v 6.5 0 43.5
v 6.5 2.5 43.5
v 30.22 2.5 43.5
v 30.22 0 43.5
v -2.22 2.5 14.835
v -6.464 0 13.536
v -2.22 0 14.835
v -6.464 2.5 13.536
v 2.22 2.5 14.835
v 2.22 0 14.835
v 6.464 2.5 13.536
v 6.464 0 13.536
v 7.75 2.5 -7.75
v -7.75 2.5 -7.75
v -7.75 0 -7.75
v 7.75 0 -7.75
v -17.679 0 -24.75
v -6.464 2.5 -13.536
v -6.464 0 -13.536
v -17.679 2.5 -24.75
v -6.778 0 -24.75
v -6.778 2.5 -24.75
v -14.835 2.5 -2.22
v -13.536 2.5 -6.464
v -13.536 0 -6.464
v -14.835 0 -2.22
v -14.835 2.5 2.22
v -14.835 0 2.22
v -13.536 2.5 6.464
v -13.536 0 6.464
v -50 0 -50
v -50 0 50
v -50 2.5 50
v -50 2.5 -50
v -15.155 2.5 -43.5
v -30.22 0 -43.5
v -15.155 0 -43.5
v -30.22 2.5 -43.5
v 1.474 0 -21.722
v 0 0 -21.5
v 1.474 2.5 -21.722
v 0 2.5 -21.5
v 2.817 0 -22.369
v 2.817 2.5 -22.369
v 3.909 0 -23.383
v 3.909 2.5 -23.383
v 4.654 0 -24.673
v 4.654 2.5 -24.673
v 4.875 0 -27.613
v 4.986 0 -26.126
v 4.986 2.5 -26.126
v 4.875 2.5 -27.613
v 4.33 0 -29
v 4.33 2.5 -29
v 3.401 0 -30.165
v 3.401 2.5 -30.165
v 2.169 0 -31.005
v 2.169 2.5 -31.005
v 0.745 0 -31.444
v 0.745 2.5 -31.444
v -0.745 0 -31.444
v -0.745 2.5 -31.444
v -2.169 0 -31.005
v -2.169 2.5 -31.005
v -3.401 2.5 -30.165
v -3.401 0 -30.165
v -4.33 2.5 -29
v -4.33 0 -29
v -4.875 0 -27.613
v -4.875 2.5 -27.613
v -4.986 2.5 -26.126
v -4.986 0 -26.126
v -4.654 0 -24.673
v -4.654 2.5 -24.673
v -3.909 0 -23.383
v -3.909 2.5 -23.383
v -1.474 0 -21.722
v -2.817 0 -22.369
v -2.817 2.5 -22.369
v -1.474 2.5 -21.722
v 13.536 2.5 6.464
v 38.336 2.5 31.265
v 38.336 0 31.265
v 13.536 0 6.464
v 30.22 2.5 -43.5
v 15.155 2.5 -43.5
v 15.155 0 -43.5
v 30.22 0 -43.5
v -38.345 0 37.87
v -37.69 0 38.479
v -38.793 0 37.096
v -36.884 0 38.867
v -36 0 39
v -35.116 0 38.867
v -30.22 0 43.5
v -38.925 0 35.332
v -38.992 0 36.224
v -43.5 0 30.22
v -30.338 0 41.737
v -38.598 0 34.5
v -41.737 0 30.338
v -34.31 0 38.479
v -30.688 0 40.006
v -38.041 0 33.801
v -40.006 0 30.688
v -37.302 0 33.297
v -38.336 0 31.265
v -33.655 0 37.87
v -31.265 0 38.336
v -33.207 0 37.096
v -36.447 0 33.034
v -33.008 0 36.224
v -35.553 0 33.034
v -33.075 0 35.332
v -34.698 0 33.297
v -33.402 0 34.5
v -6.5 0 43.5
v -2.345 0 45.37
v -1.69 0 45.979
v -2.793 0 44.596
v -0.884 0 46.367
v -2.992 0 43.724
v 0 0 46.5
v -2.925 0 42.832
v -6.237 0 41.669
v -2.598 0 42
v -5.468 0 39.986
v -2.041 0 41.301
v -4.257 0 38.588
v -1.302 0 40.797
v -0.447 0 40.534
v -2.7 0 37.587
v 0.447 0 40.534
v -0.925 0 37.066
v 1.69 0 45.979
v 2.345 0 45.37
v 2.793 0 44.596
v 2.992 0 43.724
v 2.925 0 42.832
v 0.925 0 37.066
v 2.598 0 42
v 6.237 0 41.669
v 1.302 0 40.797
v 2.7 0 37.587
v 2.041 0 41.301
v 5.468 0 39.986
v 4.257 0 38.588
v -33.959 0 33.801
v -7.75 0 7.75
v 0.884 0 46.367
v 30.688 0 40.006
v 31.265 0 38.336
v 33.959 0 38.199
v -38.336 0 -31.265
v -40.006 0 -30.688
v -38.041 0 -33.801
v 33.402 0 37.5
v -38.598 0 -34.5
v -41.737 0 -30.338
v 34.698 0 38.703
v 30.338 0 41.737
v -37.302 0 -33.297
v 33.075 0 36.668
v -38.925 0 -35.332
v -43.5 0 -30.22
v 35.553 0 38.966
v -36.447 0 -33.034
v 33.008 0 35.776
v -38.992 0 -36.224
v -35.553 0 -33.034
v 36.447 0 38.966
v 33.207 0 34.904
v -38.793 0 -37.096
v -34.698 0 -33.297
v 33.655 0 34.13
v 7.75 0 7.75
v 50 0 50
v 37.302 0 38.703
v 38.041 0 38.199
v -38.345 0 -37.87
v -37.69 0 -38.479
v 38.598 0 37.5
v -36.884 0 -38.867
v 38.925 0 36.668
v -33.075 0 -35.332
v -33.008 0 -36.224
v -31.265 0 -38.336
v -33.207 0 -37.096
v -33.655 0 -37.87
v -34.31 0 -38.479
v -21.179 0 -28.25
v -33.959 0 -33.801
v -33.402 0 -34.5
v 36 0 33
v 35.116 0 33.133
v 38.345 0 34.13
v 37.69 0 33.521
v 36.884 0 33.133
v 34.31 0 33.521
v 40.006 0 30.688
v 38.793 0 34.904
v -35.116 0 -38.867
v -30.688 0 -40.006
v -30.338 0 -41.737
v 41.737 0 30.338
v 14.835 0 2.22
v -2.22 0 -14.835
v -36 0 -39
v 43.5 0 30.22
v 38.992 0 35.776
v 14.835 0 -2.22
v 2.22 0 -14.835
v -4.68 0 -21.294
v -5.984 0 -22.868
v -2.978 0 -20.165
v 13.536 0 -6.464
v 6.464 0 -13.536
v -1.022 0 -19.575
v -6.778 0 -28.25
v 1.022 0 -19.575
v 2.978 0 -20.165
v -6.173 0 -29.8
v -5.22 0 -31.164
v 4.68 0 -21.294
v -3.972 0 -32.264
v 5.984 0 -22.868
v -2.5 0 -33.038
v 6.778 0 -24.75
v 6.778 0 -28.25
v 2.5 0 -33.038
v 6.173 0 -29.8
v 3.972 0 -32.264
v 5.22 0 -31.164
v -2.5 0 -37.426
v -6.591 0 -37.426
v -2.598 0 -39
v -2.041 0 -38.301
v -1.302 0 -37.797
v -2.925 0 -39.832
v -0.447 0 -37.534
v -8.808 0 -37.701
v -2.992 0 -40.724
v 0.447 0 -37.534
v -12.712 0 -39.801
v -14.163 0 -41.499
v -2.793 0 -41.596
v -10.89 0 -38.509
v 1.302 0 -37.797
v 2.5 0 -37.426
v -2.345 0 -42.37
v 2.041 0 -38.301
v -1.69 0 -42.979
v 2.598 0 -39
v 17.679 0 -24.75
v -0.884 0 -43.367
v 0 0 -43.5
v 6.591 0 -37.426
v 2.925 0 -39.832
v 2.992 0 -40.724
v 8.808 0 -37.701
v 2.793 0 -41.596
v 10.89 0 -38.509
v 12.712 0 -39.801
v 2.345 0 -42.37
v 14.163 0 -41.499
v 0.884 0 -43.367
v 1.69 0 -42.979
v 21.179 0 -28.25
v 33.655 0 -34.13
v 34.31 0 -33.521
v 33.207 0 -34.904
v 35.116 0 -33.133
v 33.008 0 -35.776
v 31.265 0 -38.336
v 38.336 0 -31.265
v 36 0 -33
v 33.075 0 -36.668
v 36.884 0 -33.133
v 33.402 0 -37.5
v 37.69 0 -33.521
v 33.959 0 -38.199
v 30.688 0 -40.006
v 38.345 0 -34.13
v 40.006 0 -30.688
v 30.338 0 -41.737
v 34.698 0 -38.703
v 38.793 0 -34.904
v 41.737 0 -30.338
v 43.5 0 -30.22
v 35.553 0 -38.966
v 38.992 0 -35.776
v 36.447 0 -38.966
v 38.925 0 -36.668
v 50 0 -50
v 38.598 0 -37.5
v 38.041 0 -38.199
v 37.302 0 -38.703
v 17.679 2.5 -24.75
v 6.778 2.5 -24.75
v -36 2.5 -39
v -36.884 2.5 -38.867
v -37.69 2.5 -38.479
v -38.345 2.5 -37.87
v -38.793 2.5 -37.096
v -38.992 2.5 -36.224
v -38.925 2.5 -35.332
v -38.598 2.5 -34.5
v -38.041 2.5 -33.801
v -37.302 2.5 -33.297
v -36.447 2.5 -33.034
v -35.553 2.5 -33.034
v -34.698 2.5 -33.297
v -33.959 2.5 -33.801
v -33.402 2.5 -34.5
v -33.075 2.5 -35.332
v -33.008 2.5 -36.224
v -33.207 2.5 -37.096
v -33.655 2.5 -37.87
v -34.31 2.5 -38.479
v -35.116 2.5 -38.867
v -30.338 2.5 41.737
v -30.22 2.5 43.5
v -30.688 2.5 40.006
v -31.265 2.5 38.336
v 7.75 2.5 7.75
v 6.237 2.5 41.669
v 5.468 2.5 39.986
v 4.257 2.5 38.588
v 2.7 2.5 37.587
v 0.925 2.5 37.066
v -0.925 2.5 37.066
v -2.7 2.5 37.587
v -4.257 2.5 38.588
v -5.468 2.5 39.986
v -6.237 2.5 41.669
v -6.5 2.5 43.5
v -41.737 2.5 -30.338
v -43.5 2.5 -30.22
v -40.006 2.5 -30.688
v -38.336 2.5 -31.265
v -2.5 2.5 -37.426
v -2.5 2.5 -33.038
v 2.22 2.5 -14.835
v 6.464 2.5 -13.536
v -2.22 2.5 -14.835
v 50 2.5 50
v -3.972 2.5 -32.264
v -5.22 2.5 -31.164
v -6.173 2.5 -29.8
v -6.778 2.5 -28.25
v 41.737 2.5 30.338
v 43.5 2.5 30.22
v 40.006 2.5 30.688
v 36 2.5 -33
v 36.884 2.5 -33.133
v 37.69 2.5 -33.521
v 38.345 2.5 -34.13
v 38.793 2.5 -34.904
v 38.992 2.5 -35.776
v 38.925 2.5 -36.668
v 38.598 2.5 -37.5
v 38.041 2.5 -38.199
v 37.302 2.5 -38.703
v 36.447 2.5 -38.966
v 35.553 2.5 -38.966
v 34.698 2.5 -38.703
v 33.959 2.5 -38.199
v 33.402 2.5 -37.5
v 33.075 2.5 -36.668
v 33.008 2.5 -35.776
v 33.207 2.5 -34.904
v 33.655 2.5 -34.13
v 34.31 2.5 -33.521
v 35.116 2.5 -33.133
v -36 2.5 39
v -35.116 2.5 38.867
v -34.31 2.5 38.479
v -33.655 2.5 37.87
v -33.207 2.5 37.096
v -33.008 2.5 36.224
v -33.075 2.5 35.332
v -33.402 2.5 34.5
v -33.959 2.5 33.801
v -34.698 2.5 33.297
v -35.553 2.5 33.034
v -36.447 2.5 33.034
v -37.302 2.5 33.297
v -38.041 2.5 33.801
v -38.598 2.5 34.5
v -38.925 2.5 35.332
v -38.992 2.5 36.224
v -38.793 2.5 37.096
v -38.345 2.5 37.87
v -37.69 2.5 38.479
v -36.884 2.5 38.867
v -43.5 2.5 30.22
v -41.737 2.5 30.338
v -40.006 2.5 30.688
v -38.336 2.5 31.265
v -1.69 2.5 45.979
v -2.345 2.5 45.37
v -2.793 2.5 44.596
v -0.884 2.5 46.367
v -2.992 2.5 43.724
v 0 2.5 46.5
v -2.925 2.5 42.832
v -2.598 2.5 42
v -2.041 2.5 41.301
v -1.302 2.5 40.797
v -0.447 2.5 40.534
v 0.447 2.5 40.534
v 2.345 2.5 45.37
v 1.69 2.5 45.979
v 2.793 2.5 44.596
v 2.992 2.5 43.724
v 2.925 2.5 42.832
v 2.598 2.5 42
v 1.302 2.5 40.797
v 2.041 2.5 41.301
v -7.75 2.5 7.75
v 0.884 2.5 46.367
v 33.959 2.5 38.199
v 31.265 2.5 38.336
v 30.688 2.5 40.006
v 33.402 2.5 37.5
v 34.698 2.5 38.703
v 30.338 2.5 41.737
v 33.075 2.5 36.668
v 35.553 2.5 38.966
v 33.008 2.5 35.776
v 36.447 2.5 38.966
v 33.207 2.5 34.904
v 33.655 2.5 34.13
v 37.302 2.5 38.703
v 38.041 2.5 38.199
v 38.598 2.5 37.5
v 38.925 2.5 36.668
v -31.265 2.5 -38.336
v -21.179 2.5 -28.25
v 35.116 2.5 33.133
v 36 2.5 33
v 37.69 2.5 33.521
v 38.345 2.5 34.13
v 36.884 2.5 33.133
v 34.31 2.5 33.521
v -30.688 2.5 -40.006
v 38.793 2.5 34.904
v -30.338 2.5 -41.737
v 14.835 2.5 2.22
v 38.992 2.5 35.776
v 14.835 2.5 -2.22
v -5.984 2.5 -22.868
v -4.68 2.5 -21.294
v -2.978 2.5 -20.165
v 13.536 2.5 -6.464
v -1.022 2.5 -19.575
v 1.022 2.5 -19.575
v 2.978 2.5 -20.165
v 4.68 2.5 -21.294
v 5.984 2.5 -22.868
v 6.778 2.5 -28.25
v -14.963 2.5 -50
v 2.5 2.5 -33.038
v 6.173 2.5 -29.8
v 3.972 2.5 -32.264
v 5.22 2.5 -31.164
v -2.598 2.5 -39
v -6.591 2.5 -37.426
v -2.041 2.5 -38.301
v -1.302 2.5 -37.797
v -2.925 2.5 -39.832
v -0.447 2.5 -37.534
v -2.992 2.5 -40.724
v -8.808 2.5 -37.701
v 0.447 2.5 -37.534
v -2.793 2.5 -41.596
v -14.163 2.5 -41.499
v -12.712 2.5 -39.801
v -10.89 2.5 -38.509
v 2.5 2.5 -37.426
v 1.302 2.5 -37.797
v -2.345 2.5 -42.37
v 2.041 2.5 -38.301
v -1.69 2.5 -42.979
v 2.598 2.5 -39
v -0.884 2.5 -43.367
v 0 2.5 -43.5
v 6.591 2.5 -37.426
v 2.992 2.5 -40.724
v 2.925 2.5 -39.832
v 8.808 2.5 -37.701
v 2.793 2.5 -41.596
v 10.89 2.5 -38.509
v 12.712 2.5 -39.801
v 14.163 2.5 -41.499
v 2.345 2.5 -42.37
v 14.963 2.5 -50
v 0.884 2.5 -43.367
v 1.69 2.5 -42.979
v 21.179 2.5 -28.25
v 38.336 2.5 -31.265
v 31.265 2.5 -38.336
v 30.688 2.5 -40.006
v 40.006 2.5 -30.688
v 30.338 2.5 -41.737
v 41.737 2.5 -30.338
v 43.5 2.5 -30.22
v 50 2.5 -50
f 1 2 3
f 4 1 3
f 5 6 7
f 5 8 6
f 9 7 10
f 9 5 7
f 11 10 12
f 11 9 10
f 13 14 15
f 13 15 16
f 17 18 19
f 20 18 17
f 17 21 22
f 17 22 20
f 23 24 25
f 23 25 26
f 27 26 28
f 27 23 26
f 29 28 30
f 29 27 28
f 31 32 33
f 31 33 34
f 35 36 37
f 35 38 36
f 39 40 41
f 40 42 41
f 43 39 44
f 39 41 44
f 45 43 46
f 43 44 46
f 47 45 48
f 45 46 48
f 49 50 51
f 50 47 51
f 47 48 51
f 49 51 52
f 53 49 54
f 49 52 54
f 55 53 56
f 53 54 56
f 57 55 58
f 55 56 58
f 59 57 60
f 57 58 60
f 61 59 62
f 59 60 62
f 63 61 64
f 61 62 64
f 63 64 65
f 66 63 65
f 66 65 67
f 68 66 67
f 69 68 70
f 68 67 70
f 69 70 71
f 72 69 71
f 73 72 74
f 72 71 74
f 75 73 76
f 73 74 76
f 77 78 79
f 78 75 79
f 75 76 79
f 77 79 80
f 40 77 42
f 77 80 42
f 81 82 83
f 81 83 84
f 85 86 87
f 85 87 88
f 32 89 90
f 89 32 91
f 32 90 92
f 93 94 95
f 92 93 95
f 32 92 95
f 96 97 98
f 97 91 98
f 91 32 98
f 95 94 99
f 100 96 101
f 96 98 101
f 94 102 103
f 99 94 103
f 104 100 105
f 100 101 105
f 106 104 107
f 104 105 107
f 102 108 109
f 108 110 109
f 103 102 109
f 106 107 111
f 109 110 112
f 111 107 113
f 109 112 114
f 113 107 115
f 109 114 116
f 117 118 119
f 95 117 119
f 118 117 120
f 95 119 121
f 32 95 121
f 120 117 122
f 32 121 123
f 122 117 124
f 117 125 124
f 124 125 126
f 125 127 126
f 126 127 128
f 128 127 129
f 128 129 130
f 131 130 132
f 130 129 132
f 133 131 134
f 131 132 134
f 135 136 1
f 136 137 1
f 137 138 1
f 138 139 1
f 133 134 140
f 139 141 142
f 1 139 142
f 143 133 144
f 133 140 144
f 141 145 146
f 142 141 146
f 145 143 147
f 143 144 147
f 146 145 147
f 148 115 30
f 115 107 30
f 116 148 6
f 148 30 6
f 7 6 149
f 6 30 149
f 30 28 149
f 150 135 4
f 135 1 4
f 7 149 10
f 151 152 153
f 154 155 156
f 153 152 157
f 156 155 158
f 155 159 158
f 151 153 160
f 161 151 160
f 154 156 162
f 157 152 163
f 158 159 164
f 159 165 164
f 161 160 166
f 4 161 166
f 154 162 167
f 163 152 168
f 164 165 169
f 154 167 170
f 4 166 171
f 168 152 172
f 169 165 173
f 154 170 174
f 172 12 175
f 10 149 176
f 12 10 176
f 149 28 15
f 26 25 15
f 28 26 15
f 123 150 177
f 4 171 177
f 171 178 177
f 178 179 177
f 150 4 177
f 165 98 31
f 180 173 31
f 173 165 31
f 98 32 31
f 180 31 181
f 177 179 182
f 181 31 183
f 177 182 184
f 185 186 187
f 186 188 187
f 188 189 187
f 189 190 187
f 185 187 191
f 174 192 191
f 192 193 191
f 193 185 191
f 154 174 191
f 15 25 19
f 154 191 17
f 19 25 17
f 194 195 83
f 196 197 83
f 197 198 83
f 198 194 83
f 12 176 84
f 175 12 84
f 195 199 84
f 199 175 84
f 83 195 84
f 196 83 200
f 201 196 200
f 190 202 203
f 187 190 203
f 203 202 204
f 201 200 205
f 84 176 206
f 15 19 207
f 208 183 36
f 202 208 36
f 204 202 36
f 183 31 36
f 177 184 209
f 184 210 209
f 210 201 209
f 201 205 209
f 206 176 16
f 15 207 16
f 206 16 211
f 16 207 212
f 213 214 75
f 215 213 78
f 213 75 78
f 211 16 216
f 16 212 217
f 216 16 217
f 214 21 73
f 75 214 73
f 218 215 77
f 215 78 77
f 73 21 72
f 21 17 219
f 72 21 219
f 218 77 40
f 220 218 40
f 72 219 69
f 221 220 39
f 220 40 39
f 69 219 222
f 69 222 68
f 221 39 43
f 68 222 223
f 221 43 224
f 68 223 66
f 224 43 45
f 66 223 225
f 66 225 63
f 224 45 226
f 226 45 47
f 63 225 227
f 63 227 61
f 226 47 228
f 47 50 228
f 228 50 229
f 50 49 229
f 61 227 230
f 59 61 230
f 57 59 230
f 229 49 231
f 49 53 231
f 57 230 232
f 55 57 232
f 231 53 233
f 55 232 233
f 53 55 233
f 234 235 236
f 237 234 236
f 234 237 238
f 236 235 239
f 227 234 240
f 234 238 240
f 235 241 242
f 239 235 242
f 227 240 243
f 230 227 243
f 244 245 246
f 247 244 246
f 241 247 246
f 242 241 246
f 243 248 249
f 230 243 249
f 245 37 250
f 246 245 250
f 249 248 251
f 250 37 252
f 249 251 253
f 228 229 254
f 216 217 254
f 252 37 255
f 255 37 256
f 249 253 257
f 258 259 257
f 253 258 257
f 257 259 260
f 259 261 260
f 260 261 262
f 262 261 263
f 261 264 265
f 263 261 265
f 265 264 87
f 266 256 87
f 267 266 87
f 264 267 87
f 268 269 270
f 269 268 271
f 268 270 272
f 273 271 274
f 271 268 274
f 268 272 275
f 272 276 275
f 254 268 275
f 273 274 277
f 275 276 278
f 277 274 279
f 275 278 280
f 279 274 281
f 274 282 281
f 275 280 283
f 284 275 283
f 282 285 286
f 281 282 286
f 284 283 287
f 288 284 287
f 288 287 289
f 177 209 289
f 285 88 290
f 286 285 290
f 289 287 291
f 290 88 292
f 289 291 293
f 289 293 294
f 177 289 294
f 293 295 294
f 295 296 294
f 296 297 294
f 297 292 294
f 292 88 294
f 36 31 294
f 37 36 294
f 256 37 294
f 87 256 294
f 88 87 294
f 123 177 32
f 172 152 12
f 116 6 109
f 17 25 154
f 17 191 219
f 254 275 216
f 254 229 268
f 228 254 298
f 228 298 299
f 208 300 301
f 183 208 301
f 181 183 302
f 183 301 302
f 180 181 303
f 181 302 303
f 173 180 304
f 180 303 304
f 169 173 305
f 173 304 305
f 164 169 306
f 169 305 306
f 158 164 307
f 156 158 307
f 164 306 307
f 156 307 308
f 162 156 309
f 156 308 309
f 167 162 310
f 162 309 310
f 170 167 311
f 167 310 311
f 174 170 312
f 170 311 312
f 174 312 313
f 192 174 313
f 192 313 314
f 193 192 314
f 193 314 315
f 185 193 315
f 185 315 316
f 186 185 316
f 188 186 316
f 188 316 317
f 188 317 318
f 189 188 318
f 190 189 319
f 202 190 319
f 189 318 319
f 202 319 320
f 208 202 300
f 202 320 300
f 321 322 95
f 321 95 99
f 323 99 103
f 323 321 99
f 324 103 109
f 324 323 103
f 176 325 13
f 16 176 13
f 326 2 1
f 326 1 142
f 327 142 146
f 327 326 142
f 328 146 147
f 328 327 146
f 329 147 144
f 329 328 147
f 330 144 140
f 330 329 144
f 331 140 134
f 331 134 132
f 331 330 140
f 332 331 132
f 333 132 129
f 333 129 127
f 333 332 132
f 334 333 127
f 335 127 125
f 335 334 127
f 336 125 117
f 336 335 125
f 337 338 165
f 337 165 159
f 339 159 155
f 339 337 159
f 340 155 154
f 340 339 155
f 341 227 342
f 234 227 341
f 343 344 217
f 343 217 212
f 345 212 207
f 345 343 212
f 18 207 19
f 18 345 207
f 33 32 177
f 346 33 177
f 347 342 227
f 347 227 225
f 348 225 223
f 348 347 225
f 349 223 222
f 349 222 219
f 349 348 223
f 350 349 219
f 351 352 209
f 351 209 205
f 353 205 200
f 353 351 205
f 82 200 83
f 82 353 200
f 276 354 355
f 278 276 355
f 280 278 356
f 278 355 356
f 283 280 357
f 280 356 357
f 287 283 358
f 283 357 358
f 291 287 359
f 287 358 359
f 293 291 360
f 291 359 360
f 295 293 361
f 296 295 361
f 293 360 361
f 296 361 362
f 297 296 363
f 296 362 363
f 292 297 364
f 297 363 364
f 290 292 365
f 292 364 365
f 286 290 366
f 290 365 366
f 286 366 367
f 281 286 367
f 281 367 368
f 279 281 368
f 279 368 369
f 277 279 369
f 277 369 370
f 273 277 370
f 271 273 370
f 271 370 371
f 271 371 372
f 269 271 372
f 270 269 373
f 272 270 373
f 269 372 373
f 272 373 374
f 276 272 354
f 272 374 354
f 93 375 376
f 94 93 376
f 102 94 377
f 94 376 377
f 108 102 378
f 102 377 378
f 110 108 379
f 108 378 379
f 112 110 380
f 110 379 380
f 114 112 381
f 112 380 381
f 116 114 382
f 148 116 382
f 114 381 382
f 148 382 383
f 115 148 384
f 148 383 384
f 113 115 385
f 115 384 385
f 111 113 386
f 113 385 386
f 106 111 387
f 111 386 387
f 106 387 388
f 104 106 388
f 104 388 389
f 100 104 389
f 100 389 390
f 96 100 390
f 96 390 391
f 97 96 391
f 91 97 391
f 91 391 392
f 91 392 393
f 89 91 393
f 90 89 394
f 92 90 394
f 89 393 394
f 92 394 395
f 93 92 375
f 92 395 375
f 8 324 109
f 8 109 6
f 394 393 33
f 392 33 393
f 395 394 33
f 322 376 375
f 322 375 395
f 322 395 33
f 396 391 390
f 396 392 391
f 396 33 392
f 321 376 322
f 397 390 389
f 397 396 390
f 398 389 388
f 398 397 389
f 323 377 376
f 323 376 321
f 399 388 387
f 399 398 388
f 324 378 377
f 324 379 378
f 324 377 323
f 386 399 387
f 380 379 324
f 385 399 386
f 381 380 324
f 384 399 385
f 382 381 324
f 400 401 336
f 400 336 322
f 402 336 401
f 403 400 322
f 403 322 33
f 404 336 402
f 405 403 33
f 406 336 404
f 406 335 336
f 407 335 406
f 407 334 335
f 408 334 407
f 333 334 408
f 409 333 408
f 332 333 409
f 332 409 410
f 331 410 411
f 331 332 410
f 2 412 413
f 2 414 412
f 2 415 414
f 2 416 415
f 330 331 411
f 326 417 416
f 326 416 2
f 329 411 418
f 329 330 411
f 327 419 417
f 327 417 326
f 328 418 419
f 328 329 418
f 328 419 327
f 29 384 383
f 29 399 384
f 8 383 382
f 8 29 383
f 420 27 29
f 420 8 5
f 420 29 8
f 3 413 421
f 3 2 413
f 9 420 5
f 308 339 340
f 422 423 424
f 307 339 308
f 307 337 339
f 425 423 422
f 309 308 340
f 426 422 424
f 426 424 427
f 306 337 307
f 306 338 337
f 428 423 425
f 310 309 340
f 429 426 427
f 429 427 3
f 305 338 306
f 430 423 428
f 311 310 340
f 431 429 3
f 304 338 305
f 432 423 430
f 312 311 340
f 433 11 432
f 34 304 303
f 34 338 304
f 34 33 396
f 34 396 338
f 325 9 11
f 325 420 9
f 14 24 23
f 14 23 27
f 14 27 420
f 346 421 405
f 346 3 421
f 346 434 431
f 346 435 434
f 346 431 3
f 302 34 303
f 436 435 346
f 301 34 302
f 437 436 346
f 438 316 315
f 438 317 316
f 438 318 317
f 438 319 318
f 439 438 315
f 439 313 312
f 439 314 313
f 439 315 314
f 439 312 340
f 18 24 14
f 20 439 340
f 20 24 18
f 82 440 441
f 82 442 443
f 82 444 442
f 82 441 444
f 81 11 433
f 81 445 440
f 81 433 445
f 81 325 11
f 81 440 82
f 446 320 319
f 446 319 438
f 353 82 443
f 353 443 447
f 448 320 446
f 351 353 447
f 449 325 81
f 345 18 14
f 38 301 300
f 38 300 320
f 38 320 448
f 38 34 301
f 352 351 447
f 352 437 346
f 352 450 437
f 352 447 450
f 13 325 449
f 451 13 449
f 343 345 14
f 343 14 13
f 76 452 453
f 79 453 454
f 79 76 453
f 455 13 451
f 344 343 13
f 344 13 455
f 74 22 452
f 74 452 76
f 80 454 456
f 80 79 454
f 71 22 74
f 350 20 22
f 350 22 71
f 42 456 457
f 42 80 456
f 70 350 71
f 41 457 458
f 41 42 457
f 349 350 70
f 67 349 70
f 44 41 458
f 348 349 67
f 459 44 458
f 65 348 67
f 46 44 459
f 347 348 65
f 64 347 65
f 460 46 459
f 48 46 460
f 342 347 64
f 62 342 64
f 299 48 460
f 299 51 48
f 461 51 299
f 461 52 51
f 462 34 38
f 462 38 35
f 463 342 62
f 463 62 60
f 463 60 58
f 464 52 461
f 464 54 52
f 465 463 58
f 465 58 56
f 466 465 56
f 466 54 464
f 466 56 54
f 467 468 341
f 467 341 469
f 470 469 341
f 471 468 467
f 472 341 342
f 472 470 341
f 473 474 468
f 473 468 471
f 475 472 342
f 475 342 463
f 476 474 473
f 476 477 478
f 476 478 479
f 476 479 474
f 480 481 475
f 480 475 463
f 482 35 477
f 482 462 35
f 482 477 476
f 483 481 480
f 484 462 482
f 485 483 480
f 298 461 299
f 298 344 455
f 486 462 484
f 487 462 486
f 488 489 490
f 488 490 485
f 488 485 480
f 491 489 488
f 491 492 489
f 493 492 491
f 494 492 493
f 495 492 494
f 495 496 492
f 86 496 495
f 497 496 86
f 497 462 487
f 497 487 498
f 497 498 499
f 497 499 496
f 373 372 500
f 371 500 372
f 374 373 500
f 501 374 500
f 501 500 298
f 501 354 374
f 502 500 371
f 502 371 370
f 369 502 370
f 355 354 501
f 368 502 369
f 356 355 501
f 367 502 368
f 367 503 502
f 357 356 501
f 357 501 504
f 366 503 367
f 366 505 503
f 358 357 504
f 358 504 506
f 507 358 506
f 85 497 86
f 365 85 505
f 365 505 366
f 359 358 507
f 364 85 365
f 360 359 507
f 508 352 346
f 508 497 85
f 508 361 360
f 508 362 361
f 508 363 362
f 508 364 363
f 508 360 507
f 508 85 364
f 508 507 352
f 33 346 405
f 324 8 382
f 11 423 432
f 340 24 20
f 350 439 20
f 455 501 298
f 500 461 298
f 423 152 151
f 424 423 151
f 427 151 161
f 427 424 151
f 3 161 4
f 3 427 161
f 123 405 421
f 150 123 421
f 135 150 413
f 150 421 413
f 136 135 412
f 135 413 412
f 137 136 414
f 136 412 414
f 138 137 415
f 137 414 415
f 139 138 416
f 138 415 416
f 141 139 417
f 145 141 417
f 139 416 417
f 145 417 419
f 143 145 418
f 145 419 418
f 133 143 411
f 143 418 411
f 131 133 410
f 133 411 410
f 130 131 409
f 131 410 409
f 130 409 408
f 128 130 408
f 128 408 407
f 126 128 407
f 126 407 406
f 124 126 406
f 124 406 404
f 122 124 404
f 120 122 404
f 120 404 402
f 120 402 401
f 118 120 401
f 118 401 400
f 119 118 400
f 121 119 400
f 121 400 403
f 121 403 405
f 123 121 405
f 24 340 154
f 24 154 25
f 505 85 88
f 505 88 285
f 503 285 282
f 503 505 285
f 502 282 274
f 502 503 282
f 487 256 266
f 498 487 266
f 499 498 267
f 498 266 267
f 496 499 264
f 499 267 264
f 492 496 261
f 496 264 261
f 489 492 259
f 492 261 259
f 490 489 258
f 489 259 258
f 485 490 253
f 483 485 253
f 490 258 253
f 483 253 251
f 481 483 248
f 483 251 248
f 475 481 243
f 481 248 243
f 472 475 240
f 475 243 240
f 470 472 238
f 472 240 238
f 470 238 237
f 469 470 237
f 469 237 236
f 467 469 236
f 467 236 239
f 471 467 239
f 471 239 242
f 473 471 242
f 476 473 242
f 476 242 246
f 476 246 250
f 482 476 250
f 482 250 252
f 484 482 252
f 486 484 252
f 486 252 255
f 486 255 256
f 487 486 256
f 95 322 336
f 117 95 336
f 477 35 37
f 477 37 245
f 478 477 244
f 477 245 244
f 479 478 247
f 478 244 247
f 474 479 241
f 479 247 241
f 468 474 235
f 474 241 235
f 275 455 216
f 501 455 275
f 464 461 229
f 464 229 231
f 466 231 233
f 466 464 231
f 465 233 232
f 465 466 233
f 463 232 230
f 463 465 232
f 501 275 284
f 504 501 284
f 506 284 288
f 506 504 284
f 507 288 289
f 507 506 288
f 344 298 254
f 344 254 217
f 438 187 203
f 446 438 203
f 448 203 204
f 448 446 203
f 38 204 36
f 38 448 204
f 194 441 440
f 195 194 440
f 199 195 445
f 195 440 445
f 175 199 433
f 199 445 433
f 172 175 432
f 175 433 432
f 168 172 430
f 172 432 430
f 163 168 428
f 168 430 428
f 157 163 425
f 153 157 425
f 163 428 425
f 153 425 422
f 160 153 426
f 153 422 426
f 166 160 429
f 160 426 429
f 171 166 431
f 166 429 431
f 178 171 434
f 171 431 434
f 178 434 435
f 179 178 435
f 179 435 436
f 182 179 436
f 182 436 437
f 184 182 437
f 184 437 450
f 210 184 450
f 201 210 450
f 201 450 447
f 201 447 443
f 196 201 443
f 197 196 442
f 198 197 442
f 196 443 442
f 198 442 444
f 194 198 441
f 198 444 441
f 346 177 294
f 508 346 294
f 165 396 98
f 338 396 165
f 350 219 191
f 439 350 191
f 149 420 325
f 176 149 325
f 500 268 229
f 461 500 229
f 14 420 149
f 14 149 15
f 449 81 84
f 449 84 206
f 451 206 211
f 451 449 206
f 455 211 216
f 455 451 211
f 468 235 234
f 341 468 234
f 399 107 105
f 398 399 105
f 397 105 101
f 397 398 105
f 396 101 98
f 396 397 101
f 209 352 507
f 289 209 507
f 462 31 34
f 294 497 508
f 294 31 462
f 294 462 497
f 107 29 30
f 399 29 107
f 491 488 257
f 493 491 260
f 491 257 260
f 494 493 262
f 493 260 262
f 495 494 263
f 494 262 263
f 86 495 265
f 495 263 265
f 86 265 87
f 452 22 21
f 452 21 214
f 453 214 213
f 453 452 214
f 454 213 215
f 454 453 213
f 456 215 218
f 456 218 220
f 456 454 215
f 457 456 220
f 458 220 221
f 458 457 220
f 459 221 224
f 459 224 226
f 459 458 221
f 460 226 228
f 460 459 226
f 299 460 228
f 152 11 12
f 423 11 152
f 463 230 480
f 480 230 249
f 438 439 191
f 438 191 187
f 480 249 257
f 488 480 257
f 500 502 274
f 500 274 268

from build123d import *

# Parameters (mm, degrees)
SKETCH1_W           = 100
SKETCH1_H           = 100
BOSS_EXTRUDE1_DEPTH = 2.5
SKETCH5_W           = 87
SKETCH5_H           = 87
CUT_EXTRUDE2_DEPTH  = 4
SKETCH6_R           = 15
BOSS_EXTRUDE3_DEPTH = 2.5
SKETCH7_W           = 15.5
SKETCH7_H           = 15.5
CUT_EXTRUDE3_DEPTH  = 2.5
BOSS_EXTRUDE4_DEPTH = 2.5
EXTRUDE_THIN2_DEPTH = 2.5
SKETCH10_R          = 3
CUT_EXTRUDE5_DEPTH  = 2.5
SKETCH11_R          = 6.5
BOSS_EXTRUDE5_DEPTH = 2.5
SKETCH12_R          = 3
CUT_EXTRUDE6_DEPTH  = 3
SKETCH13_R          = 7
SKETCH13_R_2        = 5
BOSS_EXTRUDE6_DEPTH = 2.5
SKETCH14_W          = 5
SKETCH14_H          = 9
EXTRUDE_THIN5_DEPTH = 2.5
SKETCH15_W          = 17.095160315
SKETCH15_H          = 3.5
EXTRUDE_THIN7_DEPTH = 2.5
BOSS_EXTRUDE8_DEPTH = 2.5
SKETCH20_W          = 31.082582927
SKETCH20_H          = 6.049047595
CUT_EXTRUDE8_DEPTH  = 2.5
SKETCH21_R          = 3
CUT_EXTRUDE9_DEPTH  = 10


with BuildPart() as part:
    # Sketch1 → Boss-Extrude1 (new body)
    with BuildSketch(Plane(origin=(0, 0, 0), x_dir=(1, 0, 0), z_dir=(0, 1, 0))):
        Rectangle(SKETCH1_W, SKETCH1_H)
    extrude(amount=BOSS_EXTRUDE1_DEPTH)

    # Sketch5 → Cut-Extrude2 (cut)
    with BuildSketch(Plane(origin=(0, 2.5, 0), x_dir=(1, 0, 0), z_dir=(0, 1, 0))):
        Rectangle(SKETCH5_W, SKETCH5_H)
    extrude(amount=-CUT_EXTRUDE2_DEPTH, mode=Mode.SUBTRACT)

    # Sketch8 → Boss-Extrude4 (add)
    with BuildSketch(Plane(origin=(0, 2.5, 0), x_dir=(1, 0, 0), z_dir=(0, 1, 0))):
        with BuildLine():
            Line((-43.5, -43.5), (-30.220069463, -43.5))
            ThreePointArc((-30.220069463, -43.5), (-34.109671064, -34.109671064), (-43.5, -30.220069463))
            Line((-43.5, -30.220069463), (-43.5, -43.5))
        make_face()
        with BuildLine():
            ThreePointArc((-43.5, 30.220069463), (-34.109671064, 34.109671064), (-30.220069463, 43.5))
            Line((-30.220069463, 43.5), (-43.5, 43.5))
            Line((-43.5, 43.5), (-43.5, 30.220069463))
        make_face()
        with BuildLine():
            Line((43.5, 43.5), (30.220069463, 43.5))
            ThreePointArc((30.220069463, 43.5), (34.109671064, 34.109671064), (43.5, 30.220069463))
            Line((43.5, 30.220069463), (43.5, 43.5))
        make_face()
        with BuildLine():
            ThreePointArc((43.5, -30.220069463), (34.109671064, -34.109671064), (30.220069463, -43.5))
            Line((30.220069463, -43.5), (43.5, -43.5))
            Line((43.5, -43.5), (43.5, -30.220069463))
        make_face()
    extrude(amount=-BOSS_EXTRUDE4_DEPTH)



with BuildPart() as body_2:
    # Sketch6 → Boss-Extrude3 (new body)
    with BuildSketch(Plane(origin=(0, 2.5, 0), x_dir=(1, 0, 0), z_dir=(0, 1, 0))):
        with Locations(Location((0, 0, 0), (0, 0, 270))):
            Circle(SKETCH6_R)
    extrude(amount=-BOSS_EXTRUDE3_DEPTH)

    # Sketch7 → Cut-Extrude3 (cut)
    with BuildSketch(Plane(origin=(0, 2.5, 0), x_dir=(1, 0, 0), z_dir=(0, 1, 0))):
        Rectangle(SKETCH7_W, SKETCH7_H)
    extrude(amount=-CUT_EXTRUDE3_DEPTH, mode=Mode.SUBTRACT)


with BuildPart() as part_1:
    add(part.part)

    add(body_2.part)  # Extrude-Thin2 merges body 2
    # Sketch9 → Extrude-Thin2 (add)
    with BuildSketch(Plane(origin=(0, 2.5, 0), x_dir=(1, 0, 0), z_dir=(0, 1, 0))):
        Polygon((4.214466094, -11.285533906), (34.46870341, -41.539771222), (41.539771222, -34.46870341), (11.285533906, -4.214466094), align=None)
        Polygon((-11.285533906, -4.214466094), (-41.539771222, -34.46870341), (-34.46870341, -41.539771222), (-4.214466094, -11.285533906), align=None)
        Polygon((11.285533906, 4.214466094), (41.539771222, 34.46870341), (34.46870341, 41.539771222), (4.214466094, 11.285533906), align=None)
        Polygon((-4.214466094, 11.285533906), (-34.46870341, 41.539771222), (-41.539771222, 34.46870341), (-11.285533906, 4.214466094), align=None)
    extrude(amount=-EXTRUDE_THIN2_DEPTH)

    # Sketch10 → Cut-Extrude5 (cut)
    with BuildSketch(Plane(origin=(0, 2.5, 0), x_dir=(1, 0, 0), z_dir=(0, 1, 0))):
        with Locations(Location((36, 36, 0), (0, 0, 270))):
            Circle(SKETCH10_R)
        with Locations(Location((-36, 36, 0), (0, 0, 90))):
            Circle(SKETCH10_R)
        with Locations(Location((36, -36, 0), (0, 0, 90))):
            Circle(SKETCH10_R)
        with Locations(Location((-36, -36, 0), (0, 0, 270))):
            Circle(SKETCH10_R)
    extrude(amount=-CUT_EXTRUDE5_DEPTH, mode=Mode.SUBTRACT)

    # Sketch11 → Boss-Extrude5 (add)
    with BuildSketch(Plane(origin=(0, 2.5, 0), x_dir=(1, 0, 0), z_dir=(0, 1, 0))):
        with Locations((0, -43.5)):
            Circle(SKETCH11_R)
        with Locations((0, 43.5)):
            Circle(SKETCH11_R)
    extrude(amount=-BOSS_EXTRUDE5_DEPTH)

    # Sketch12 → Cut-Extrude6 (cut)
    with BuildSketch(Plane(origin=(0, 2.5, 0), x_dir=(1, 0, 0), z_dir=(0, 1, 0))):
        with Locations(Location((0, 43.5, 0), (0, 0, 270))):
            Circle(SKETCH12_R)
        with Locations(Location((0, -43.5, 0), (0, 0, 270))):
            Circle(SKETCH12_R)
    extrude(amount=-CUT_EXTRUDE6_DEPTH, mode=Mode.SUBTRACT)



with BuildPart() as body_2_2:
    # Sketch13 → Boss-Extrude6 (new body)
    with BuildSketch(Plane(origin=(0, 2.5, 0), x_dir=(1, 0, 0), z_dir=(0, 1, 0))):
        with Locations(Location((0, 26.5, 0), (0, 0, 270))):
            Circle(SKETCH13_R)
        with Locations(Location((0, 26.5, 0), (0, 0, 270))):
            Circle(SKETCH13_R_2, mode=Mode.SUBTRACT)
    extrude(amount=-BOSS_EXTRUDE6_DEPTH)


with BuildPart() as part_2:
    add(part_1.part)

    add(body_2_2.part)  # Extrude-Thin5 merges body 2 2
    # Sketch14 → Extrude-Thin5 (add)
    with BuildSketch(Plane(origin=(0, 0, 0), x_dir=(-1, 0, 0), z_dir=(0, -1, 0))):
        with Locations((0, 36)):
            Rectangle(SKETCH14_W, SKETCH14_H)
    extrude(amount=-EXTRUDE_THIN5_DEPTH)

    # Sketch15 → Extrude-Thin7 (add)
    with BuildSketch(Plane(origin=(0, 0, 0), x_dir=(-1, 0, 0), z_dir=(0, -1, 0))):
        with Locations((-13.979094467, 26.5)):
            Rectangle(SKETCH15_W, SKETCH15_H)
        with Locations((13.979094467, 26.5)):
            Rectangle(SKETCH15_W, SKETCH15_H)
    extrude(amount=-EXTRUDE_THIN7_DEPTH)

    # Sketch17 → Boss-Extrude8 (add)
    with BuildSketch(Plane(origin=(0, 0, 0), x_dir=(-1, 0, 0), z_dir=(0, -1, 0))):
        with BuildLine():
            Line((6.591379734, 37.425929606), (-6.591379734, 37.425929606))
            ThreePointArc((-6.591379734, 37.425929606), (-15.665450128, 46.5), (-6.591379734, 55.574070394))
            Line((-6.591379734, 55.574070394), (6.591379734, 55.574070394))
            ThreePointArc((6.591379734, 55.574070394), (15.665450128, 46.5), (6.591379734, 37.425929606))
        make_face()
    extrude(amount=-BOSS_EXTRUDE8_DEPTH)

    # Sketch20 → Cut-Extrude8 (cut)
    with BuildSketch(Plane(origin=(0, 0, 0), x_dir=(-1, 0, 0), z_dir=(0, -1, 0))):
        with Locations((-0.578009107, 53.024523798)):
            Rectangle(SKETCH20_W, SKETCH20_H)
    extrude(amount=-CUT_EXTRUDE8_DEPTH, mode=Mode.SUBTRACT)

    # Sketch21 → Cut-Extrude9 (cut)
    with BuildSketch(Plane(origin=(0, 0, 0), x_dir=(-1, 0, 0), z_dir=(0, -1, 0))):
        with Locations(Location((0, 40.5, 0), (0, 0, 90))):
            Circle(SKETCH21_R)
    extrude(amount=-CUT_EXTRUDE9_DEPTH, mode=Mode.SUBTRACT)


solid = part_2.part
